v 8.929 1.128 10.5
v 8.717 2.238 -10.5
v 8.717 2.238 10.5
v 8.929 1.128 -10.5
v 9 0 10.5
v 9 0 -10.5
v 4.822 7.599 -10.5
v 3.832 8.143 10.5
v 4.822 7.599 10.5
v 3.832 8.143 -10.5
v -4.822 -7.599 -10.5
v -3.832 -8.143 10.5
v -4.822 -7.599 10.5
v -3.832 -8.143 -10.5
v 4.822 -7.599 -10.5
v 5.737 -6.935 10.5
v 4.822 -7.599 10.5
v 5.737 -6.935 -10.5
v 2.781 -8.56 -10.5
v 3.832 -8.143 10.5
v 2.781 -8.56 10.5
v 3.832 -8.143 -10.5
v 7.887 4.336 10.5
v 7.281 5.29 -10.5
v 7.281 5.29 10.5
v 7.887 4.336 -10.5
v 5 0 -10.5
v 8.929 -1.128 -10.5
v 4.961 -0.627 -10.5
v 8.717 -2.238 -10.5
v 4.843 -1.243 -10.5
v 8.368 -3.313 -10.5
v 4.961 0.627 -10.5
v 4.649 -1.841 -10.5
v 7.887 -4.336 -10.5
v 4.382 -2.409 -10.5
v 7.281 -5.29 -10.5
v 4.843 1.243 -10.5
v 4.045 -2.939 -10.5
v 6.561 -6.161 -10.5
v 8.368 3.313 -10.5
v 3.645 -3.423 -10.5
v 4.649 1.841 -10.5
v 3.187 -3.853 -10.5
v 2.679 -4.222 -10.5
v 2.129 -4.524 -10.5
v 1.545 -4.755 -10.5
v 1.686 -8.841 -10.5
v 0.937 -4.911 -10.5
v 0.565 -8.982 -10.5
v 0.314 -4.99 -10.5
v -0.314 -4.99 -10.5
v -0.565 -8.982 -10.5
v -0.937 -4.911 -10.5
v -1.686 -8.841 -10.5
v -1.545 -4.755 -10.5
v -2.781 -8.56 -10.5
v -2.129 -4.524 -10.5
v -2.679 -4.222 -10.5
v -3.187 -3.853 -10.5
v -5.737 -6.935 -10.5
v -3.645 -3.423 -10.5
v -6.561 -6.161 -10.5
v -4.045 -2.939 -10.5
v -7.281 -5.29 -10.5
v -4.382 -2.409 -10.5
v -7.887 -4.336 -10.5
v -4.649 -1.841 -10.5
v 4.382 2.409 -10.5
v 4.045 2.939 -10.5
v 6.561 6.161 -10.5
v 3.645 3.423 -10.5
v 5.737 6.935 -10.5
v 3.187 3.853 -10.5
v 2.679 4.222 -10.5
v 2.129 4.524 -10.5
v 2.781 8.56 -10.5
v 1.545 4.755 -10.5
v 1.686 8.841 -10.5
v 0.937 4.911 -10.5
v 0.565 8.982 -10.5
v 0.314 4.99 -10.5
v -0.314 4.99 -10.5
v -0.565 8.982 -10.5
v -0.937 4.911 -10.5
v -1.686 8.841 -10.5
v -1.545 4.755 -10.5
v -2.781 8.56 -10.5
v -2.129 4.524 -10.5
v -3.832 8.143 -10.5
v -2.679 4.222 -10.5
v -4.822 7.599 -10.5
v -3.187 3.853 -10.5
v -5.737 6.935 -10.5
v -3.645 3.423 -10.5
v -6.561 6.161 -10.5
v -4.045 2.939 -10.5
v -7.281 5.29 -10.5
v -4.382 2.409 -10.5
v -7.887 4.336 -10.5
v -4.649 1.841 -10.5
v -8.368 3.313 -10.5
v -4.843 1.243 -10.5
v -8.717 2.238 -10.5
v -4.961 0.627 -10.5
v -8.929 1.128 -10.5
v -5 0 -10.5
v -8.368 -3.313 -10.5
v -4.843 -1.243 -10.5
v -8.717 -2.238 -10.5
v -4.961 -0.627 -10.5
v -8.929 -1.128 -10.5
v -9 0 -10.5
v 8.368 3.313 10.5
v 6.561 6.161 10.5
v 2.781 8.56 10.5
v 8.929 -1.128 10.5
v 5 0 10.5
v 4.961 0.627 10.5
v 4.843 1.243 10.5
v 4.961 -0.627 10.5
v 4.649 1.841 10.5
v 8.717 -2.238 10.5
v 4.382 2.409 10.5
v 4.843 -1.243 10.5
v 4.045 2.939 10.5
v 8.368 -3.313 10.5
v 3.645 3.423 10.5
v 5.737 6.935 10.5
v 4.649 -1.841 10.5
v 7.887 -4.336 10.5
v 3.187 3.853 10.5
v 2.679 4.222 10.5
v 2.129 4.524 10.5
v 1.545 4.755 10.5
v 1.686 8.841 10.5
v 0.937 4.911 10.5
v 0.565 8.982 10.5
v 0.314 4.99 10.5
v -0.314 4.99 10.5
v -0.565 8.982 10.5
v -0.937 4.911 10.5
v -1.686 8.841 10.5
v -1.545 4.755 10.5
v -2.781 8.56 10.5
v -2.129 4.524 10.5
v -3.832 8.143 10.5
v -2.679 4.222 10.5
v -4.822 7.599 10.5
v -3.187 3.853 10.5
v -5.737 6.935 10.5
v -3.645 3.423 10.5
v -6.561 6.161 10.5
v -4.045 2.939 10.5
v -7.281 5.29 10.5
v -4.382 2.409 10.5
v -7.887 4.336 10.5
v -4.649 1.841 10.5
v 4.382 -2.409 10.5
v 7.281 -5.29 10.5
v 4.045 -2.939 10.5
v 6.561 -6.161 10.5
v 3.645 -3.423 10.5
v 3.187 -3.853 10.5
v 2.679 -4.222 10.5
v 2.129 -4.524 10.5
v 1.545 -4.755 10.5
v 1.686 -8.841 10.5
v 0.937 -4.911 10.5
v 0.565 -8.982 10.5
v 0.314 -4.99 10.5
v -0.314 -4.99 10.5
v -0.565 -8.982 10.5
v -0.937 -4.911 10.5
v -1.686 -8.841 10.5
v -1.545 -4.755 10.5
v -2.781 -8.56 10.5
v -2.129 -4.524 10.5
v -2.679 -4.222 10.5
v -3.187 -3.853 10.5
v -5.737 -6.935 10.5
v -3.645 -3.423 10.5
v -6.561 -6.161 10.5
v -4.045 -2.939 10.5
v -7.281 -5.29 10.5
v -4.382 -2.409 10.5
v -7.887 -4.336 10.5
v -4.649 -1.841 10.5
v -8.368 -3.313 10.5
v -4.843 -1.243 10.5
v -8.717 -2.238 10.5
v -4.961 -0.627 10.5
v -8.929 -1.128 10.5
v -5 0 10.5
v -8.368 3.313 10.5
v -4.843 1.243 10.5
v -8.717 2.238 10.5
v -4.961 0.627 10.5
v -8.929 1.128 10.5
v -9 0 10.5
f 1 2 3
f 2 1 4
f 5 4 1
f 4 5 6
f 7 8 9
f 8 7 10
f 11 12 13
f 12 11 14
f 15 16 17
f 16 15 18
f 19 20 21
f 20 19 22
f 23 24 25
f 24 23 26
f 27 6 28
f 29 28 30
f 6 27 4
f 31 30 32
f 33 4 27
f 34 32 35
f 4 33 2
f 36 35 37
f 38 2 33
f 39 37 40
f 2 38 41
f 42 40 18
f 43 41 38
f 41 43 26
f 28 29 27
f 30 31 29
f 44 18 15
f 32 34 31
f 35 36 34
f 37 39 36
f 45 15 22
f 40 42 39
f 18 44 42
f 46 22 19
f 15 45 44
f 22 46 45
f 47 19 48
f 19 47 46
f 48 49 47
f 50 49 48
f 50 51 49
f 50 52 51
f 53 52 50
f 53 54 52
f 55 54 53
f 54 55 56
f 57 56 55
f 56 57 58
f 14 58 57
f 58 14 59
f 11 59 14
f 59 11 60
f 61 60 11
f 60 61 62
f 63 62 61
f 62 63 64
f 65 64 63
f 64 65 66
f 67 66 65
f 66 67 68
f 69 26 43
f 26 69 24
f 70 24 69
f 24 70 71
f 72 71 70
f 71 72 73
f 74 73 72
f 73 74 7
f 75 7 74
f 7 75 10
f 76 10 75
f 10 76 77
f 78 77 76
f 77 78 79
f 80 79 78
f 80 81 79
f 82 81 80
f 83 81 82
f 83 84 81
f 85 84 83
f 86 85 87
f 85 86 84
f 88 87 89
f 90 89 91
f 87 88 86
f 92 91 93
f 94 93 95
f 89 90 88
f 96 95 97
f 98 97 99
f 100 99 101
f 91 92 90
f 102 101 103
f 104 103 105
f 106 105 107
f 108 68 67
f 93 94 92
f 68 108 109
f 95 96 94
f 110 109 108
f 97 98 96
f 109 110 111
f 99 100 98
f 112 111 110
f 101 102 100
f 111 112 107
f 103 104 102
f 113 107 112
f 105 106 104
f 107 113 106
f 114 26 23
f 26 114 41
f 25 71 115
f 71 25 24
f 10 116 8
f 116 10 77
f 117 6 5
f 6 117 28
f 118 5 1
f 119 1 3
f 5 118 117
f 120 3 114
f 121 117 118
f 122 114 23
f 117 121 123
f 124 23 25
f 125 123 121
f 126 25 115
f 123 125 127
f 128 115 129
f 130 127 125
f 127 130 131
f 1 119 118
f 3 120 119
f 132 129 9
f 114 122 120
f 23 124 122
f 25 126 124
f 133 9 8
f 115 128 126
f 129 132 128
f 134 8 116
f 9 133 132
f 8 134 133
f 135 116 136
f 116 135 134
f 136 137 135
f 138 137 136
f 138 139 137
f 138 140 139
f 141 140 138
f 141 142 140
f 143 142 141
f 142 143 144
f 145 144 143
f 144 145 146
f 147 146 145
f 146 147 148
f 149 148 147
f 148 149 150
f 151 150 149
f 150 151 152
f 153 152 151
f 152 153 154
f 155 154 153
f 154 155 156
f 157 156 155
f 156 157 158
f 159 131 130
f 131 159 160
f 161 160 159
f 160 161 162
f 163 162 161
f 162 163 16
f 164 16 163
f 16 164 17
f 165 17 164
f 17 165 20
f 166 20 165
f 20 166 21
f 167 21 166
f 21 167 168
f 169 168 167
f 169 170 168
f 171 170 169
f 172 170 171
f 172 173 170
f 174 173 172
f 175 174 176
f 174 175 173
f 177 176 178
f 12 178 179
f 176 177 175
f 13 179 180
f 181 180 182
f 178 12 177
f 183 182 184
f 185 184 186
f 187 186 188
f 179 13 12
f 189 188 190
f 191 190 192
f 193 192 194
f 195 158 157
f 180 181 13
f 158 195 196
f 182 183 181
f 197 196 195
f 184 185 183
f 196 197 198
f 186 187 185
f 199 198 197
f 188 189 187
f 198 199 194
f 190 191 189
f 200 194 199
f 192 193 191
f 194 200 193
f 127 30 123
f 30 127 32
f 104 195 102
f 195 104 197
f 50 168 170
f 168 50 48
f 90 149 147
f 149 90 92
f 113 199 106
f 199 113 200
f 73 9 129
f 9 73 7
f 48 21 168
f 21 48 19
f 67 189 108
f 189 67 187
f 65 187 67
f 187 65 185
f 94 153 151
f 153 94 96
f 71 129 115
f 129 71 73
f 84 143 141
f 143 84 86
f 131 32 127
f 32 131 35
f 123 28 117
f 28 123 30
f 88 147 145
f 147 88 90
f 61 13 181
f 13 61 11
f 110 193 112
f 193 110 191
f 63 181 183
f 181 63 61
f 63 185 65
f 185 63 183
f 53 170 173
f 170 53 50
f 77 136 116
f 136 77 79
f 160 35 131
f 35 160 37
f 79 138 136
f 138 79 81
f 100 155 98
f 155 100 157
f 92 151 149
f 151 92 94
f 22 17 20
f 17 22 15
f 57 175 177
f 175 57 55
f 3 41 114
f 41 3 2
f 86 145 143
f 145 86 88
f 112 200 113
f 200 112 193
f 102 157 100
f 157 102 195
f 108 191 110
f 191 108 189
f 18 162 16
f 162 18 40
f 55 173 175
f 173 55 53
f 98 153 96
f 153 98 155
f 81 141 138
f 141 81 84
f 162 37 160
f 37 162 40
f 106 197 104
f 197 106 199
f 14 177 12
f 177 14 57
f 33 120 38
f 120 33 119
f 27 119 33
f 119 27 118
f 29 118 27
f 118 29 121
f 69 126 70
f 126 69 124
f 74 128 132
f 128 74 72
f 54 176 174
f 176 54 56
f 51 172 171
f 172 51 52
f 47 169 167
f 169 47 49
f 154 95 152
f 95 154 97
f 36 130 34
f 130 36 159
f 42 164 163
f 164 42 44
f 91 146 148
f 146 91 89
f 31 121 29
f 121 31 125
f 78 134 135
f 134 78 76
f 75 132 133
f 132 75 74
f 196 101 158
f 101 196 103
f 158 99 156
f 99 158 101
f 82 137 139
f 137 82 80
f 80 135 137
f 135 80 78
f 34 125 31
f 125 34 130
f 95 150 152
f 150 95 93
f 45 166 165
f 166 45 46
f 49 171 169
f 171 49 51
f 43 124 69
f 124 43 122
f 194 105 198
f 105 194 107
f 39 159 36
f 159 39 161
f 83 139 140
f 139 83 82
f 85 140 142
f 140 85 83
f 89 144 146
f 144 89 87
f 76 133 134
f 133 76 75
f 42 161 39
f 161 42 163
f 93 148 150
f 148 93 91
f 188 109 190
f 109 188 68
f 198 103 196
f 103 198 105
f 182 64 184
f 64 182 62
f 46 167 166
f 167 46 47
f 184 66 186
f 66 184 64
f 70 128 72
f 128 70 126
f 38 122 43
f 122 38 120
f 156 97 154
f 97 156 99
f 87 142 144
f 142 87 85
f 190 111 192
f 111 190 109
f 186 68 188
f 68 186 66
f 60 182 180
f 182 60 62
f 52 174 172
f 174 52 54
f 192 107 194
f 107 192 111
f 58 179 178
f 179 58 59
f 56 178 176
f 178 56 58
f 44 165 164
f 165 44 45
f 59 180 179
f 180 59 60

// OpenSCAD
$fn = 50;


difference() {
	union() {
		translate(v = [0, 0, -10.5000000000]) {
			cylinder(h = 21, r = 9.0000000000);
		}
	}
	union() {
		translate(v = [0, 0, -100.0000000000]) {
			cylinder(h = 200, r = 5.0000000000);
		}
	}
}
